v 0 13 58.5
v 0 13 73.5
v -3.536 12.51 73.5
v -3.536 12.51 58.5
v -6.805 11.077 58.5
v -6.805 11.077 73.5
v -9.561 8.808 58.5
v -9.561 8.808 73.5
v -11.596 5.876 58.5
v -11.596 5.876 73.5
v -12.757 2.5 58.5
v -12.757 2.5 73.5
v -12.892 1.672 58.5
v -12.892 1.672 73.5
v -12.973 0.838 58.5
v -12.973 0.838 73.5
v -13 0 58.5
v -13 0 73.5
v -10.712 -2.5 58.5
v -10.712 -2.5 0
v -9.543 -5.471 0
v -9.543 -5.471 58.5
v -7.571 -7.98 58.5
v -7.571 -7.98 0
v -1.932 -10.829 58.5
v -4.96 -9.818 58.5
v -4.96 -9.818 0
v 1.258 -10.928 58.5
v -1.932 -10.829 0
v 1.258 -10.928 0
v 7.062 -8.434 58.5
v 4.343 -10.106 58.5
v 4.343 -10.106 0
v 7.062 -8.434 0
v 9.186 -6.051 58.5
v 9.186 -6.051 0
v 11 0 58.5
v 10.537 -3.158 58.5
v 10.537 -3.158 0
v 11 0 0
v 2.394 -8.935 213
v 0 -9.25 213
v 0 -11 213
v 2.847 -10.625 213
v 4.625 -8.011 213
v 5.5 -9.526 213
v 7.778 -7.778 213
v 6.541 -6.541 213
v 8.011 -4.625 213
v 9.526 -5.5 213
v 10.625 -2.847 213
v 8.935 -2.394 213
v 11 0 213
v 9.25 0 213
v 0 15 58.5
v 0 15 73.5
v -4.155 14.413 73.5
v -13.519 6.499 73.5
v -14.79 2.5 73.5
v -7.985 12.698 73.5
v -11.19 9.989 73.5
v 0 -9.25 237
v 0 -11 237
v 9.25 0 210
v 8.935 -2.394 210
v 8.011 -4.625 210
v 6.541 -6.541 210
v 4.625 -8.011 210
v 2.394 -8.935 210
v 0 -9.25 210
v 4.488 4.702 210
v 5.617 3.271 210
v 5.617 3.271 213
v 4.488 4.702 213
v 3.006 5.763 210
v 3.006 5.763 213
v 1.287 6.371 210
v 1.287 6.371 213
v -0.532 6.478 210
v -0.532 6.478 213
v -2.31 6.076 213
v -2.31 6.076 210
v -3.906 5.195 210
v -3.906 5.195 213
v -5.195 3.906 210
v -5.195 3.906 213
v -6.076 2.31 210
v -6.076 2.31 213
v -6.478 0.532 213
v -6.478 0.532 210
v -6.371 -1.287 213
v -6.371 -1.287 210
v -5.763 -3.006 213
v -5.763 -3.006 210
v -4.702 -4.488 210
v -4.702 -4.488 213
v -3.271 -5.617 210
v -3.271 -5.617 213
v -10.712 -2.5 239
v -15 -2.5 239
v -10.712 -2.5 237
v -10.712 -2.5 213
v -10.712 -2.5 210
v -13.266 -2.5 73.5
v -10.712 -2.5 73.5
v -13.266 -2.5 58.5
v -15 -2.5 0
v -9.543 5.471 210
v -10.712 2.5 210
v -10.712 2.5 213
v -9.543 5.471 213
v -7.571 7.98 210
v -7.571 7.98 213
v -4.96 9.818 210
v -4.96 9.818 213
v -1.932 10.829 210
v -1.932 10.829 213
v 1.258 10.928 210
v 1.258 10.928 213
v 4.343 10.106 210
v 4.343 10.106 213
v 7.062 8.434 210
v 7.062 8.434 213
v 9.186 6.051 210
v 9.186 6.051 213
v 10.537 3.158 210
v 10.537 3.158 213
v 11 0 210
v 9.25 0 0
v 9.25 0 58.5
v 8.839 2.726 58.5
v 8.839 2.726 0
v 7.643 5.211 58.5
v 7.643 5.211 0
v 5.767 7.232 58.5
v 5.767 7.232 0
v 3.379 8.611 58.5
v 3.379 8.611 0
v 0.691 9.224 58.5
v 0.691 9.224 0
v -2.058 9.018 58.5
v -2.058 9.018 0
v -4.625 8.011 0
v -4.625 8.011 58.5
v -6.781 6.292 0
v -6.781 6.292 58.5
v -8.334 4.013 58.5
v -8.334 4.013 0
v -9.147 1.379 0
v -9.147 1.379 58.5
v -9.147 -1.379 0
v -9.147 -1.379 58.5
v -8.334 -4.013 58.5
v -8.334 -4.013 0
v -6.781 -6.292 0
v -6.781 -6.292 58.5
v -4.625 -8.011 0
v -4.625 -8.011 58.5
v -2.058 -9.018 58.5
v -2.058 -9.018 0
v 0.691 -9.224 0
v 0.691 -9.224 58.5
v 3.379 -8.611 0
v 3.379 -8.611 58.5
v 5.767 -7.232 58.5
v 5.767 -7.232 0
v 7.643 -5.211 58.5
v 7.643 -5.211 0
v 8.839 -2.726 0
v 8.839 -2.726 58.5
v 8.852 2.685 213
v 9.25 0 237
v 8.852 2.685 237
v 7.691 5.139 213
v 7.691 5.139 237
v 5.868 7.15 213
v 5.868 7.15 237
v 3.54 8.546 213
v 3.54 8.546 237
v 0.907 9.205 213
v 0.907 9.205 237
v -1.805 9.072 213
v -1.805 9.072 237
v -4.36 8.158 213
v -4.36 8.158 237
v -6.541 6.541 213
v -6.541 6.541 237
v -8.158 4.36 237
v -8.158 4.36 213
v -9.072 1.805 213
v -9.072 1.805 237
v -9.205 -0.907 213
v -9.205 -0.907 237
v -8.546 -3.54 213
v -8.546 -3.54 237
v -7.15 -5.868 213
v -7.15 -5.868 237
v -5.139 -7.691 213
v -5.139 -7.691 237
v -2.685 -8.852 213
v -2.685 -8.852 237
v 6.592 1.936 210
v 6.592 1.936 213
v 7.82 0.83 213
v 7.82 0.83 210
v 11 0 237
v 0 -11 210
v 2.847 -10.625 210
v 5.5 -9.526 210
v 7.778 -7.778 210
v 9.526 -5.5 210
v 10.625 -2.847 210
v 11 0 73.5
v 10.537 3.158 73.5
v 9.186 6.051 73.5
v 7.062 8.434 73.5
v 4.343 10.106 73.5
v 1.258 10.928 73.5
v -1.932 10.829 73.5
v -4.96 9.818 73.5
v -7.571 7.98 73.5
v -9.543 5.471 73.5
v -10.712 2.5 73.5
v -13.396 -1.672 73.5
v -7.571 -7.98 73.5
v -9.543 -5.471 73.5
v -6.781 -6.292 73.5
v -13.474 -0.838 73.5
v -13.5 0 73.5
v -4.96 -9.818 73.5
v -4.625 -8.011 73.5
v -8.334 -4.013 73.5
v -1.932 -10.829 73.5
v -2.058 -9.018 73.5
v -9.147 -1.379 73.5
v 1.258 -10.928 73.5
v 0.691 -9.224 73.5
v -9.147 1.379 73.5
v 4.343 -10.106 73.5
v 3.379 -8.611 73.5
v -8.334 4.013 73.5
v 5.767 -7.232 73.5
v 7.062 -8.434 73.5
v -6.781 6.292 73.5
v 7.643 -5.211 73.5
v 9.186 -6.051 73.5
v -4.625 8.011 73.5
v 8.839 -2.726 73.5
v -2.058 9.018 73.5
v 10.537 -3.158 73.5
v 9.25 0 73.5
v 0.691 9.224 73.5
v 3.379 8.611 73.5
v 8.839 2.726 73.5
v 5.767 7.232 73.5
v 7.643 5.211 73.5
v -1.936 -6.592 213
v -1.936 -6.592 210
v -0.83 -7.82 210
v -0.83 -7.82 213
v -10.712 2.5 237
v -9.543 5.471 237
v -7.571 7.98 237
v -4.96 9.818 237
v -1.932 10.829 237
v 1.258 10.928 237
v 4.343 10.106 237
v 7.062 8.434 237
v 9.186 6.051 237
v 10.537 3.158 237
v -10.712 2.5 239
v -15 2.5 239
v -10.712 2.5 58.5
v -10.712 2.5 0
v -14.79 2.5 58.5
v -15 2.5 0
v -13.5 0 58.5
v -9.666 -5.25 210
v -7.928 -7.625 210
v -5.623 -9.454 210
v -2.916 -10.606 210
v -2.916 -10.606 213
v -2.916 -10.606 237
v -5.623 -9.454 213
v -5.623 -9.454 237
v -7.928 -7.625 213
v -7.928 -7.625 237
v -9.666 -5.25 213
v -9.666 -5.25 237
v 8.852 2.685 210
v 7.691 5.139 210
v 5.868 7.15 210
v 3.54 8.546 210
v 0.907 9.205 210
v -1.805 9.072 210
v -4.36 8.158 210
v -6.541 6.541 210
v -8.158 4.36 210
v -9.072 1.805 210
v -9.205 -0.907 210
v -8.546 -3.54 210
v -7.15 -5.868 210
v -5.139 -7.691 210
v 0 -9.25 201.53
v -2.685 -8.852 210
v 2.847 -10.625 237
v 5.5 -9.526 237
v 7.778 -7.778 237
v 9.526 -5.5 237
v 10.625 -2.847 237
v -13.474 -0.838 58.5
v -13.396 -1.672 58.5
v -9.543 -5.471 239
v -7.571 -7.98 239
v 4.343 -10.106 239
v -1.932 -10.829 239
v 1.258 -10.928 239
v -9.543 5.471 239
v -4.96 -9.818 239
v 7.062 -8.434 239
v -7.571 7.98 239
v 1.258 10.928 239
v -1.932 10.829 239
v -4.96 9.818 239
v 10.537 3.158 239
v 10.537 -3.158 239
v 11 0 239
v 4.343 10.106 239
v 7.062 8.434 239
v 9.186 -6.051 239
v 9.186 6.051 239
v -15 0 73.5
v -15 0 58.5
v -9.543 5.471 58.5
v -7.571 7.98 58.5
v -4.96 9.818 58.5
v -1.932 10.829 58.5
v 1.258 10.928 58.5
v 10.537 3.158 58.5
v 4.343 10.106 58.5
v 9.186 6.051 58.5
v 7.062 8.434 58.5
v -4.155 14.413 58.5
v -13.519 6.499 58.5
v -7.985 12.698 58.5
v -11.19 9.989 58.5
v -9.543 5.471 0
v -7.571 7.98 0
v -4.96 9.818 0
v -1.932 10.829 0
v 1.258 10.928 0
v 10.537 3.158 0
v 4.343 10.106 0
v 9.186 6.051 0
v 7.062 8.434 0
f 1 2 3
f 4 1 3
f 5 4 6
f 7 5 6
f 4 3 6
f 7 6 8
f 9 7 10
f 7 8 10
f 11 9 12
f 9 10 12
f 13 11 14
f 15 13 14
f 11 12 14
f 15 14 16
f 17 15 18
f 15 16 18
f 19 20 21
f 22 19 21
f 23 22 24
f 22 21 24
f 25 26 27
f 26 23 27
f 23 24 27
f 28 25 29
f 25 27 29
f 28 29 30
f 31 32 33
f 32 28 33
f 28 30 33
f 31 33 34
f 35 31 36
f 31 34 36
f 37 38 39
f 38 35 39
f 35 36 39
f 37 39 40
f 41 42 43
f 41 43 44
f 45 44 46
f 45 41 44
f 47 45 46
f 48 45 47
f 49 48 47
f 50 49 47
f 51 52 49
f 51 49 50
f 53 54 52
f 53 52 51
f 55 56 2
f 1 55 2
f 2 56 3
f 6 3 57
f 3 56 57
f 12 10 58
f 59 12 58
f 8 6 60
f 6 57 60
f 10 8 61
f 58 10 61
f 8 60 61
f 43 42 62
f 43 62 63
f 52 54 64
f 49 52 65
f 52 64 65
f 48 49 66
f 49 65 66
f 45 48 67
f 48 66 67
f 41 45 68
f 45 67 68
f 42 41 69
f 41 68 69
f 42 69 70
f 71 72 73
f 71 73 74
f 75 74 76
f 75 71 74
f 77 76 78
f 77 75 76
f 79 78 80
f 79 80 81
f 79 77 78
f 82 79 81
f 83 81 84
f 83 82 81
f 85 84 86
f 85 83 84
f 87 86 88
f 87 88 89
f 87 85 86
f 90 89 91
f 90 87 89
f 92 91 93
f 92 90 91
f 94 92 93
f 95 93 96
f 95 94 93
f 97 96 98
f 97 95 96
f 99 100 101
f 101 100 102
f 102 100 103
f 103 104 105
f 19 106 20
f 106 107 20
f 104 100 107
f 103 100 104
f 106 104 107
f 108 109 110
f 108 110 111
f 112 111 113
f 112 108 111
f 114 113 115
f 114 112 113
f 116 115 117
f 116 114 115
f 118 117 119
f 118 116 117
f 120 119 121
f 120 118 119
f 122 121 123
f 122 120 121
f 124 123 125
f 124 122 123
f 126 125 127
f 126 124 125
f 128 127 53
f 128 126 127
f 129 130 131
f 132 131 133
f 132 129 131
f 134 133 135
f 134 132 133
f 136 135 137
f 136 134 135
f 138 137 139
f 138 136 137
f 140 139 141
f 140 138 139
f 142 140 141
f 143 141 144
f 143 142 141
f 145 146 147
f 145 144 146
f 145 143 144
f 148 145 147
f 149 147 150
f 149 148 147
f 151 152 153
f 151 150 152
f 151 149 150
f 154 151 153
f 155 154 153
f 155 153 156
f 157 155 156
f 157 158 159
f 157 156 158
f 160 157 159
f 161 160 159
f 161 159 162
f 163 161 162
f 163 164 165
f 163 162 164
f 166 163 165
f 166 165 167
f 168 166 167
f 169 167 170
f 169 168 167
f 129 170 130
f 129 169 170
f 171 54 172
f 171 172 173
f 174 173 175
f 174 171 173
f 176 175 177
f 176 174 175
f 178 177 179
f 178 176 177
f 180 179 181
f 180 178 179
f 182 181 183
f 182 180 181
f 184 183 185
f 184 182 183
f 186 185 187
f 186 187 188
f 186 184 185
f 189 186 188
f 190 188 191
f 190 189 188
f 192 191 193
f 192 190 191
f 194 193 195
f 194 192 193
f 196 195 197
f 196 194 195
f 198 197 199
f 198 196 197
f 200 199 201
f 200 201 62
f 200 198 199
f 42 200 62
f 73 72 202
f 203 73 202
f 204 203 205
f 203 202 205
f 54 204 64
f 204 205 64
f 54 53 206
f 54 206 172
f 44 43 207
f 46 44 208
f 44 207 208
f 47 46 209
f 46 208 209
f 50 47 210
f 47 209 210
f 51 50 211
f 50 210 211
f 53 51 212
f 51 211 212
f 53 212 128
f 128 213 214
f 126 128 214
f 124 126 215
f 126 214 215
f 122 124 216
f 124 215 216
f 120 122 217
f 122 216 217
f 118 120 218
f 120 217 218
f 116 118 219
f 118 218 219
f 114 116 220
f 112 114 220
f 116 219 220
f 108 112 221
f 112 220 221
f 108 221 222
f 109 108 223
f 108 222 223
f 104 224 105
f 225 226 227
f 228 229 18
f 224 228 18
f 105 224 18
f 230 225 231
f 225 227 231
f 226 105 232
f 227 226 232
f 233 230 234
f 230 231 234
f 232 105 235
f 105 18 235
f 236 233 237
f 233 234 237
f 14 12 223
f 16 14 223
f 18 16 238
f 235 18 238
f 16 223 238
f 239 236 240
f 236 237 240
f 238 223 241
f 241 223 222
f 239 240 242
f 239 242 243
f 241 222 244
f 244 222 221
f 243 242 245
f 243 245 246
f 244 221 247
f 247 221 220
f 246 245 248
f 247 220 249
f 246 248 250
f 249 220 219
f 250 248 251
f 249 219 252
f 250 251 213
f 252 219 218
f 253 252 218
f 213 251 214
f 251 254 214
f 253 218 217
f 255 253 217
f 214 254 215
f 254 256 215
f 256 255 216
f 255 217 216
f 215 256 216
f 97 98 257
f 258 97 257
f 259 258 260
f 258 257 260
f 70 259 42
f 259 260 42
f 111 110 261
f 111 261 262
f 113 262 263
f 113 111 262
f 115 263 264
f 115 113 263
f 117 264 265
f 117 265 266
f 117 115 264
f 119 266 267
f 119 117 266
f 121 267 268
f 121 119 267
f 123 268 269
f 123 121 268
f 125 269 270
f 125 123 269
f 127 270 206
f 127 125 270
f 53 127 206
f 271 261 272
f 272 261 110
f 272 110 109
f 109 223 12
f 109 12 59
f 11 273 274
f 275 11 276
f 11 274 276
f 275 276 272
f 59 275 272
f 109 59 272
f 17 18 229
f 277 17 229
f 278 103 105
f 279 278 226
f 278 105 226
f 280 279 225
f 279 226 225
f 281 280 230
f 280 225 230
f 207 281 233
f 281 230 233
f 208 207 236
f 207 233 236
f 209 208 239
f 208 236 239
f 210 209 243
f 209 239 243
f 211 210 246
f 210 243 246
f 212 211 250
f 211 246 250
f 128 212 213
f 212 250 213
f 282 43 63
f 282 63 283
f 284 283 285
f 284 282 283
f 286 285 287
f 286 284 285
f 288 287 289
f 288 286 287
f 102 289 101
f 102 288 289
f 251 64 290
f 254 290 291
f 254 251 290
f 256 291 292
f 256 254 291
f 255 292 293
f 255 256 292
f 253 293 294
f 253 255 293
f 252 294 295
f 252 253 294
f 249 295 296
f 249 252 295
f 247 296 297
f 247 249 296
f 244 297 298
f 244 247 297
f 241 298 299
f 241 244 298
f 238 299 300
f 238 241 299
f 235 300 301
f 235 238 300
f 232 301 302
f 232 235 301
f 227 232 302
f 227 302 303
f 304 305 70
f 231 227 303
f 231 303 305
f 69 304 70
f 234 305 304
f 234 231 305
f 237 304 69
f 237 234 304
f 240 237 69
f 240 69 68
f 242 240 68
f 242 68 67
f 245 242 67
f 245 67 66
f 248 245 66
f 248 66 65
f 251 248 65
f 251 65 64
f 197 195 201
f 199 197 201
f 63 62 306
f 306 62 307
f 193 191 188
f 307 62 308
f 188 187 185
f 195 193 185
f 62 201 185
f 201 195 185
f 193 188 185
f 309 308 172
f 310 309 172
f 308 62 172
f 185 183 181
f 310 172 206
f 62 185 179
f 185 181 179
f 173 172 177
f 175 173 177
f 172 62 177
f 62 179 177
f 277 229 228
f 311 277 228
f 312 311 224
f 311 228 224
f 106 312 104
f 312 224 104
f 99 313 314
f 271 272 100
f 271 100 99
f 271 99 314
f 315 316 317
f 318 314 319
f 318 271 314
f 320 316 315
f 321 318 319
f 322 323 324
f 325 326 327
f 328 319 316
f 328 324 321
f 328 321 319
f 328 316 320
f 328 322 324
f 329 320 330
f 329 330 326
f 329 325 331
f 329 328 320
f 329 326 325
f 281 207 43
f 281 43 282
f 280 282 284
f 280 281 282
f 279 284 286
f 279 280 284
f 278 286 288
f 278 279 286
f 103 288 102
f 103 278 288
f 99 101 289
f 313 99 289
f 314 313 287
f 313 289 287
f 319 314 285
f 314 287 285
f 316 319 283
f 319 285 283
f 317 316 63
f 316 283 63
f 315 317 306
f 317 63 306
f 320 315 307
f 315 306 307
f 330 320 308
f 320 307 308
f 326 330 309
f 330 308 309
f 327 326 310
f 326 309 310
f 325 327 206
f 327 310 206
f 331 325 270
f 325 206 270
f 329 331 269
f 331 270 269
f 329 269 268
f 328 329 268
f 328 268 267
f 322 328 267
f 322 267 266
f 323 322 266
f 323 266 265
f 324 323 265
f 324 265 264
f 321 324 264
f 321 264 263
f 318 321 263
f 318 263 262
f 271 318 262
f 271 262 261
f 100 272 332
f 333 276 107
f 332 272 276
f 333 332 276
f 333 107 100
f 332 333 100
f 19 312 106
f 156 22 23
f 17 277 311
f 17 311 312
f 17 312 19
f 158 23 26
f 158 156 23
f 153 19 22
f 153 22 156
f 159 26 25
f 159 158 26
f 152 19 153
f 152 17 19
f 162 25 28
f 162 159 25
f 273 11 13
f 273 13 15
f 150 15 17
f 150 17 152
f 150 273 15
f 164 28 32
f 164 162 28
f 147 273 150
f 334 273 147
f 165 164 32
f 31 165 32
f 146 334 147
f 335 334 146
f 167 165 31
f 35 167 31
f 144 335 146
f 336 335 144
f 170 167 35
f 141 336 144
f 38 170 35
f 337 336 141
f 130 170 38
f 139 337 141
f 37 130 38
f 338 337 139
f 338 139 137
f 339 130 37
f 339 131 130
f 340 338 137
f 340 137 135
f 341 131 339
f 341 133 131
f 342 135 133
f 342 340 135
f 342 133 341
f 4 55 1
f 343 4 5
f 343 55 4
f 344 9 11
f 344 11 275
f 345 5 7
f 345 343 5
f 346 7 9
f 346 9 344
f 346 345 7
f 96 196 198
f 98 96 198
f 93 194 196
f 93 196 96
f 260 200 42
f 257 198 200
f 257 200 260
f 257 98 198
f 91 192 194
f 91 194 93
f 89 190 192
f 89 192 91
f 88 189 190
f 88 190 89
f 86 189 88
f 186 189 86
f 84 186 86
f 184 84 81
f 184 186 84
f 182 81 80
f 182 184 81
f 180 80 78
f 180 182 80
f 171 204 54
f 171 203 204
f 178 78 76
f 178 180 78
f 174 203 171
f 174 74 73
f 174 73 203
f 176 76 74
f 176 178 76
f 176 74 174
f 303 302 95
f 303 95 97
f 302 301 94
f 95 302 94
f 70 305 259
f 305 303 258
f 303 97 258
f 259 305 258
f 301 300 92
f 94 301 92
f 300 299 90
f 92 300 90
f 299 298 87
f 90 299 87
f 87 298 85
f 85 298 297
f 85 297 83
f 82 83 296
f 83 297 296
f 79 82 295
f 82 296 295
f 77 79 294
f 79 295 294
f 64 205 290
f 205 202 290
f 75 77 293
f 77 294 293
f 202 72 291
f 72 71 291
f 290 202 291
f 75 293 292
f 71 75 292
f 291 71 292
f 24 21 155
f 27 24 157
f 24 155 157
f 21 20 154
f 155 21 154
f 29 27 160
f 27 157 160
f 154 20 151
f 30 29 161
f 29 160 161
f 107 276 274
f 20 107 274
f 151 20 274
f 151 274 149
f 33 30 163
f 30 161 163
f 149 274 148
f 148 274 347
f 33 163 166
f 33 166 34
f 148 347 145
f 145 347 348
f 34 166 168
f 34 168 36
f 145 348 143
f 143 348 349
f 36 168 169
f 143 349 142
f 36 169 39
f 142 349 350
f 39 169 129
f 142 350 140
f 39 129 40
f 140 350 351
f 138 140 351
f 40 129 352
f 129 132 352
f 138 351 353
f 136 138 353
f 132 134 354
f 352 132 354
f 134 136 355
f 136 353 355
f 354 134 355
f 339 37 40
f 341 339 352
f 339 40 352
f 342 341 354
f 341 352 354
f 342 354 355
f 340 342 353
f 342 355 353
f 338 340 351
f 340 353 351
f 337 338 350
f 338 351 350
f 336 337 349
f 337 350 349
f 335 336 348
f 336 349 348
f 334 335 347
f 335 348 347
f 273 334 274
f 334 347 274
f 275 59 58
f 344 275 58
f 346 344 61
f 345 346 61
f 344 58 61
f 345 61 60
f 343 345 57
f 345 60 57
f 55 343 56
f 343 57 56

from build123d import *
from build123d.topology import SkipClean

# Parameters (mm, degrees)
SCHIZZO1_R                    = 11
SCHIZZO1_R_2                  = 9.25
TUBO_DEPTH                    = 210
INGRESSOCAVI_DEPTH            = 27
SCHIZZO4_R                    = 11
SCHIZZO4_R_2                  = 6.5
FONDOCORSA_DEPTH              = 3
SCHIZZO5_R                    = 11
TAPPO_DEPTH                   = 2
BASEINFERIORE_DEPTH           = 239
SCHIZZO7_R                    = 13.5
TAGLIOANELLO_DEPTH            = 15
SUPPORTOANELLO_DEPTH          = 15
FACILITAZIONEUSCITACAVI_DEPTH = 3
RACCORDOFACILITAZIONECAVI_R   = 8


with BuildPart() as part:
    # Schizzo1 → Tubo (new body)
    with BuildSketch(Plane.XY):
        Circle(SCHIZZO1_R)
        Circle(SCHIZZO1_R_2, mode=Mode.SUBTRACT)
    extrude(amount=TUBO_DEPTH)

    # Schizzo2 → IngressoCavi (add)
    with BuildSketch(Plane.XY.offset(210)):
        with BuildLine():
            Line((0, -9.25), (0, -11))
            ThreePointArc((0, -11), (-7.778174593, 7.778174593), (11, 0))
            Line((11, 0), (9.25, 0))
            ThreePointArc((9.25, 0), (-6.540737726, 6.540737726), (0, -9.25))
        make_face()
    extrude(amount=INGRESSOCAVI_DEPTH)

    # Schizzo4 → FondoCorsa (add)
    with SkipClean():  # the faces are left unmerged after this step: merging them gives an invalid solid
        with BuildSketch(Plane.XY.offset(210)):
            Circle(SCHIZZO4_R)
            Circle(SCHIZZO4_R_2, mode=Mode.SUBTRACT)
        extrude(amount=FONDOCORSA_DEPTH)

    # Schizzo5 → Tappo (add)
    with SkipClean():  # the faces are left unmerged after this step: merging them gives an invalid solid
        with BuildSketch(Plane.XY.offset(237)):
            Circle(SCHIZZO5_R)
        extrude(amount=TAPPO_DEPTH)
    add(part.part.scale(1), mode=Mode.REPLACE)  # the faces are merged on a copy

    # Schizzo6 → BaseInferiore (add)
    with SkipClean():  # the faces are left unmerged after this step: merging them gives an invalid solid
        with BuildSketch(Plane.XY):
            Polygon((-11, 2.5), (-15, 2.5), (-15, -2.5), (-11, -2.5), (-10.712142643, -2.5), (-10.712142643, 2.5), align=None)
        extrude(amount=BASEINFERIORE_DEPTH)

    # Schizzo7 → TaglioAnello (cut)
    with BuildSketch(Plane.XY.offset(73.5)):
        Circle(SCHIZZO7_R)
    extrude(amount=-TAGLIOANELLO_DEPTH, mode=Mode.SUBTRACT)

    # Schizzo8 → SupportoAnello (add)
    with SkipClean():  # the faces are left unmerged after this step: merging them gives an invalid solid
        with BuildSketch(Plane.XY.offset(73.5)):
            with BuildLine():
                Line((0, 15), (0, 13))
                ThreePointArc((0, 13), (-9.192388155, 9.192388155), (-13, 0))
                Line((-13, 0), (-15, 0))
                ThreePointArc((-15, 0), (-10.606601718, 10.606601718), (0, 15))
            make_face()
        extrude(amount=-SUPPORTOANELLO_DEPTH)

    # Schizzo9 → FacilitazioneUscitaCavi (cut)
    with SkipClean():  # the faces are left unmerged after this step: merging them gives an invalid solid
        with BuildSketch(Plane(origin=(0, 0, 210), x_dir=(-1, 0, 0), z_dir=(0, 0, -1))):
            with BuildLine():
                Line((0, 0), (-9.25, 0))
                ThreePointArc((-9.25, 0), (-6.540737726, -6.540737726), (0, -9.25))
                Line((0, -9.25), (0, 0))
            make_face()
        extrude(amount=-FACILITAZIONEUSCITACAVI_DEPTH, mode=Mode.SUBTRACT)

    # RaccordoFacilitazioneCavi
    # the kernel refuses this fillet: 8 mm, written as the material it takes off along each edge
    with BuildSketch(Plane(origin=(6.5, 0, 201.530207244), x_dir=(1, 0, 0), z_dir=(0, 0, 1)), Plane(origin=(0, -6.5, 221.469792756), x_dir=(0, -1, 0), z_dir=(0, 0, -1))) as raccordofacilitazionecavi_piece_1:
        with BuildLine():
            CenterArc((6.030405405, 7.296501927), RACCORDOFACILITAZIONECAVI_R, 210.212403153, 35.579578639)
            Line((-0.882921715, 3.270845692), (-1.021188257, 3.190332567))
            ThreePointArc((-1.021188257, 3.190332567), (-0.379082322, 1.65226111), (-0.16, 0))
            Line((-0.16, 0), (0, -0.16))
            ThreePointArc((0, -0.16), (1.375, -0.16), (2.684391892, -0.145930039))
            Line((2.684391892, -0.145930039), (2.75, 0))
        make_face()
    extrude(amount=19.939585512, mode=Mode.SUBTRACT)


solid = part.part
